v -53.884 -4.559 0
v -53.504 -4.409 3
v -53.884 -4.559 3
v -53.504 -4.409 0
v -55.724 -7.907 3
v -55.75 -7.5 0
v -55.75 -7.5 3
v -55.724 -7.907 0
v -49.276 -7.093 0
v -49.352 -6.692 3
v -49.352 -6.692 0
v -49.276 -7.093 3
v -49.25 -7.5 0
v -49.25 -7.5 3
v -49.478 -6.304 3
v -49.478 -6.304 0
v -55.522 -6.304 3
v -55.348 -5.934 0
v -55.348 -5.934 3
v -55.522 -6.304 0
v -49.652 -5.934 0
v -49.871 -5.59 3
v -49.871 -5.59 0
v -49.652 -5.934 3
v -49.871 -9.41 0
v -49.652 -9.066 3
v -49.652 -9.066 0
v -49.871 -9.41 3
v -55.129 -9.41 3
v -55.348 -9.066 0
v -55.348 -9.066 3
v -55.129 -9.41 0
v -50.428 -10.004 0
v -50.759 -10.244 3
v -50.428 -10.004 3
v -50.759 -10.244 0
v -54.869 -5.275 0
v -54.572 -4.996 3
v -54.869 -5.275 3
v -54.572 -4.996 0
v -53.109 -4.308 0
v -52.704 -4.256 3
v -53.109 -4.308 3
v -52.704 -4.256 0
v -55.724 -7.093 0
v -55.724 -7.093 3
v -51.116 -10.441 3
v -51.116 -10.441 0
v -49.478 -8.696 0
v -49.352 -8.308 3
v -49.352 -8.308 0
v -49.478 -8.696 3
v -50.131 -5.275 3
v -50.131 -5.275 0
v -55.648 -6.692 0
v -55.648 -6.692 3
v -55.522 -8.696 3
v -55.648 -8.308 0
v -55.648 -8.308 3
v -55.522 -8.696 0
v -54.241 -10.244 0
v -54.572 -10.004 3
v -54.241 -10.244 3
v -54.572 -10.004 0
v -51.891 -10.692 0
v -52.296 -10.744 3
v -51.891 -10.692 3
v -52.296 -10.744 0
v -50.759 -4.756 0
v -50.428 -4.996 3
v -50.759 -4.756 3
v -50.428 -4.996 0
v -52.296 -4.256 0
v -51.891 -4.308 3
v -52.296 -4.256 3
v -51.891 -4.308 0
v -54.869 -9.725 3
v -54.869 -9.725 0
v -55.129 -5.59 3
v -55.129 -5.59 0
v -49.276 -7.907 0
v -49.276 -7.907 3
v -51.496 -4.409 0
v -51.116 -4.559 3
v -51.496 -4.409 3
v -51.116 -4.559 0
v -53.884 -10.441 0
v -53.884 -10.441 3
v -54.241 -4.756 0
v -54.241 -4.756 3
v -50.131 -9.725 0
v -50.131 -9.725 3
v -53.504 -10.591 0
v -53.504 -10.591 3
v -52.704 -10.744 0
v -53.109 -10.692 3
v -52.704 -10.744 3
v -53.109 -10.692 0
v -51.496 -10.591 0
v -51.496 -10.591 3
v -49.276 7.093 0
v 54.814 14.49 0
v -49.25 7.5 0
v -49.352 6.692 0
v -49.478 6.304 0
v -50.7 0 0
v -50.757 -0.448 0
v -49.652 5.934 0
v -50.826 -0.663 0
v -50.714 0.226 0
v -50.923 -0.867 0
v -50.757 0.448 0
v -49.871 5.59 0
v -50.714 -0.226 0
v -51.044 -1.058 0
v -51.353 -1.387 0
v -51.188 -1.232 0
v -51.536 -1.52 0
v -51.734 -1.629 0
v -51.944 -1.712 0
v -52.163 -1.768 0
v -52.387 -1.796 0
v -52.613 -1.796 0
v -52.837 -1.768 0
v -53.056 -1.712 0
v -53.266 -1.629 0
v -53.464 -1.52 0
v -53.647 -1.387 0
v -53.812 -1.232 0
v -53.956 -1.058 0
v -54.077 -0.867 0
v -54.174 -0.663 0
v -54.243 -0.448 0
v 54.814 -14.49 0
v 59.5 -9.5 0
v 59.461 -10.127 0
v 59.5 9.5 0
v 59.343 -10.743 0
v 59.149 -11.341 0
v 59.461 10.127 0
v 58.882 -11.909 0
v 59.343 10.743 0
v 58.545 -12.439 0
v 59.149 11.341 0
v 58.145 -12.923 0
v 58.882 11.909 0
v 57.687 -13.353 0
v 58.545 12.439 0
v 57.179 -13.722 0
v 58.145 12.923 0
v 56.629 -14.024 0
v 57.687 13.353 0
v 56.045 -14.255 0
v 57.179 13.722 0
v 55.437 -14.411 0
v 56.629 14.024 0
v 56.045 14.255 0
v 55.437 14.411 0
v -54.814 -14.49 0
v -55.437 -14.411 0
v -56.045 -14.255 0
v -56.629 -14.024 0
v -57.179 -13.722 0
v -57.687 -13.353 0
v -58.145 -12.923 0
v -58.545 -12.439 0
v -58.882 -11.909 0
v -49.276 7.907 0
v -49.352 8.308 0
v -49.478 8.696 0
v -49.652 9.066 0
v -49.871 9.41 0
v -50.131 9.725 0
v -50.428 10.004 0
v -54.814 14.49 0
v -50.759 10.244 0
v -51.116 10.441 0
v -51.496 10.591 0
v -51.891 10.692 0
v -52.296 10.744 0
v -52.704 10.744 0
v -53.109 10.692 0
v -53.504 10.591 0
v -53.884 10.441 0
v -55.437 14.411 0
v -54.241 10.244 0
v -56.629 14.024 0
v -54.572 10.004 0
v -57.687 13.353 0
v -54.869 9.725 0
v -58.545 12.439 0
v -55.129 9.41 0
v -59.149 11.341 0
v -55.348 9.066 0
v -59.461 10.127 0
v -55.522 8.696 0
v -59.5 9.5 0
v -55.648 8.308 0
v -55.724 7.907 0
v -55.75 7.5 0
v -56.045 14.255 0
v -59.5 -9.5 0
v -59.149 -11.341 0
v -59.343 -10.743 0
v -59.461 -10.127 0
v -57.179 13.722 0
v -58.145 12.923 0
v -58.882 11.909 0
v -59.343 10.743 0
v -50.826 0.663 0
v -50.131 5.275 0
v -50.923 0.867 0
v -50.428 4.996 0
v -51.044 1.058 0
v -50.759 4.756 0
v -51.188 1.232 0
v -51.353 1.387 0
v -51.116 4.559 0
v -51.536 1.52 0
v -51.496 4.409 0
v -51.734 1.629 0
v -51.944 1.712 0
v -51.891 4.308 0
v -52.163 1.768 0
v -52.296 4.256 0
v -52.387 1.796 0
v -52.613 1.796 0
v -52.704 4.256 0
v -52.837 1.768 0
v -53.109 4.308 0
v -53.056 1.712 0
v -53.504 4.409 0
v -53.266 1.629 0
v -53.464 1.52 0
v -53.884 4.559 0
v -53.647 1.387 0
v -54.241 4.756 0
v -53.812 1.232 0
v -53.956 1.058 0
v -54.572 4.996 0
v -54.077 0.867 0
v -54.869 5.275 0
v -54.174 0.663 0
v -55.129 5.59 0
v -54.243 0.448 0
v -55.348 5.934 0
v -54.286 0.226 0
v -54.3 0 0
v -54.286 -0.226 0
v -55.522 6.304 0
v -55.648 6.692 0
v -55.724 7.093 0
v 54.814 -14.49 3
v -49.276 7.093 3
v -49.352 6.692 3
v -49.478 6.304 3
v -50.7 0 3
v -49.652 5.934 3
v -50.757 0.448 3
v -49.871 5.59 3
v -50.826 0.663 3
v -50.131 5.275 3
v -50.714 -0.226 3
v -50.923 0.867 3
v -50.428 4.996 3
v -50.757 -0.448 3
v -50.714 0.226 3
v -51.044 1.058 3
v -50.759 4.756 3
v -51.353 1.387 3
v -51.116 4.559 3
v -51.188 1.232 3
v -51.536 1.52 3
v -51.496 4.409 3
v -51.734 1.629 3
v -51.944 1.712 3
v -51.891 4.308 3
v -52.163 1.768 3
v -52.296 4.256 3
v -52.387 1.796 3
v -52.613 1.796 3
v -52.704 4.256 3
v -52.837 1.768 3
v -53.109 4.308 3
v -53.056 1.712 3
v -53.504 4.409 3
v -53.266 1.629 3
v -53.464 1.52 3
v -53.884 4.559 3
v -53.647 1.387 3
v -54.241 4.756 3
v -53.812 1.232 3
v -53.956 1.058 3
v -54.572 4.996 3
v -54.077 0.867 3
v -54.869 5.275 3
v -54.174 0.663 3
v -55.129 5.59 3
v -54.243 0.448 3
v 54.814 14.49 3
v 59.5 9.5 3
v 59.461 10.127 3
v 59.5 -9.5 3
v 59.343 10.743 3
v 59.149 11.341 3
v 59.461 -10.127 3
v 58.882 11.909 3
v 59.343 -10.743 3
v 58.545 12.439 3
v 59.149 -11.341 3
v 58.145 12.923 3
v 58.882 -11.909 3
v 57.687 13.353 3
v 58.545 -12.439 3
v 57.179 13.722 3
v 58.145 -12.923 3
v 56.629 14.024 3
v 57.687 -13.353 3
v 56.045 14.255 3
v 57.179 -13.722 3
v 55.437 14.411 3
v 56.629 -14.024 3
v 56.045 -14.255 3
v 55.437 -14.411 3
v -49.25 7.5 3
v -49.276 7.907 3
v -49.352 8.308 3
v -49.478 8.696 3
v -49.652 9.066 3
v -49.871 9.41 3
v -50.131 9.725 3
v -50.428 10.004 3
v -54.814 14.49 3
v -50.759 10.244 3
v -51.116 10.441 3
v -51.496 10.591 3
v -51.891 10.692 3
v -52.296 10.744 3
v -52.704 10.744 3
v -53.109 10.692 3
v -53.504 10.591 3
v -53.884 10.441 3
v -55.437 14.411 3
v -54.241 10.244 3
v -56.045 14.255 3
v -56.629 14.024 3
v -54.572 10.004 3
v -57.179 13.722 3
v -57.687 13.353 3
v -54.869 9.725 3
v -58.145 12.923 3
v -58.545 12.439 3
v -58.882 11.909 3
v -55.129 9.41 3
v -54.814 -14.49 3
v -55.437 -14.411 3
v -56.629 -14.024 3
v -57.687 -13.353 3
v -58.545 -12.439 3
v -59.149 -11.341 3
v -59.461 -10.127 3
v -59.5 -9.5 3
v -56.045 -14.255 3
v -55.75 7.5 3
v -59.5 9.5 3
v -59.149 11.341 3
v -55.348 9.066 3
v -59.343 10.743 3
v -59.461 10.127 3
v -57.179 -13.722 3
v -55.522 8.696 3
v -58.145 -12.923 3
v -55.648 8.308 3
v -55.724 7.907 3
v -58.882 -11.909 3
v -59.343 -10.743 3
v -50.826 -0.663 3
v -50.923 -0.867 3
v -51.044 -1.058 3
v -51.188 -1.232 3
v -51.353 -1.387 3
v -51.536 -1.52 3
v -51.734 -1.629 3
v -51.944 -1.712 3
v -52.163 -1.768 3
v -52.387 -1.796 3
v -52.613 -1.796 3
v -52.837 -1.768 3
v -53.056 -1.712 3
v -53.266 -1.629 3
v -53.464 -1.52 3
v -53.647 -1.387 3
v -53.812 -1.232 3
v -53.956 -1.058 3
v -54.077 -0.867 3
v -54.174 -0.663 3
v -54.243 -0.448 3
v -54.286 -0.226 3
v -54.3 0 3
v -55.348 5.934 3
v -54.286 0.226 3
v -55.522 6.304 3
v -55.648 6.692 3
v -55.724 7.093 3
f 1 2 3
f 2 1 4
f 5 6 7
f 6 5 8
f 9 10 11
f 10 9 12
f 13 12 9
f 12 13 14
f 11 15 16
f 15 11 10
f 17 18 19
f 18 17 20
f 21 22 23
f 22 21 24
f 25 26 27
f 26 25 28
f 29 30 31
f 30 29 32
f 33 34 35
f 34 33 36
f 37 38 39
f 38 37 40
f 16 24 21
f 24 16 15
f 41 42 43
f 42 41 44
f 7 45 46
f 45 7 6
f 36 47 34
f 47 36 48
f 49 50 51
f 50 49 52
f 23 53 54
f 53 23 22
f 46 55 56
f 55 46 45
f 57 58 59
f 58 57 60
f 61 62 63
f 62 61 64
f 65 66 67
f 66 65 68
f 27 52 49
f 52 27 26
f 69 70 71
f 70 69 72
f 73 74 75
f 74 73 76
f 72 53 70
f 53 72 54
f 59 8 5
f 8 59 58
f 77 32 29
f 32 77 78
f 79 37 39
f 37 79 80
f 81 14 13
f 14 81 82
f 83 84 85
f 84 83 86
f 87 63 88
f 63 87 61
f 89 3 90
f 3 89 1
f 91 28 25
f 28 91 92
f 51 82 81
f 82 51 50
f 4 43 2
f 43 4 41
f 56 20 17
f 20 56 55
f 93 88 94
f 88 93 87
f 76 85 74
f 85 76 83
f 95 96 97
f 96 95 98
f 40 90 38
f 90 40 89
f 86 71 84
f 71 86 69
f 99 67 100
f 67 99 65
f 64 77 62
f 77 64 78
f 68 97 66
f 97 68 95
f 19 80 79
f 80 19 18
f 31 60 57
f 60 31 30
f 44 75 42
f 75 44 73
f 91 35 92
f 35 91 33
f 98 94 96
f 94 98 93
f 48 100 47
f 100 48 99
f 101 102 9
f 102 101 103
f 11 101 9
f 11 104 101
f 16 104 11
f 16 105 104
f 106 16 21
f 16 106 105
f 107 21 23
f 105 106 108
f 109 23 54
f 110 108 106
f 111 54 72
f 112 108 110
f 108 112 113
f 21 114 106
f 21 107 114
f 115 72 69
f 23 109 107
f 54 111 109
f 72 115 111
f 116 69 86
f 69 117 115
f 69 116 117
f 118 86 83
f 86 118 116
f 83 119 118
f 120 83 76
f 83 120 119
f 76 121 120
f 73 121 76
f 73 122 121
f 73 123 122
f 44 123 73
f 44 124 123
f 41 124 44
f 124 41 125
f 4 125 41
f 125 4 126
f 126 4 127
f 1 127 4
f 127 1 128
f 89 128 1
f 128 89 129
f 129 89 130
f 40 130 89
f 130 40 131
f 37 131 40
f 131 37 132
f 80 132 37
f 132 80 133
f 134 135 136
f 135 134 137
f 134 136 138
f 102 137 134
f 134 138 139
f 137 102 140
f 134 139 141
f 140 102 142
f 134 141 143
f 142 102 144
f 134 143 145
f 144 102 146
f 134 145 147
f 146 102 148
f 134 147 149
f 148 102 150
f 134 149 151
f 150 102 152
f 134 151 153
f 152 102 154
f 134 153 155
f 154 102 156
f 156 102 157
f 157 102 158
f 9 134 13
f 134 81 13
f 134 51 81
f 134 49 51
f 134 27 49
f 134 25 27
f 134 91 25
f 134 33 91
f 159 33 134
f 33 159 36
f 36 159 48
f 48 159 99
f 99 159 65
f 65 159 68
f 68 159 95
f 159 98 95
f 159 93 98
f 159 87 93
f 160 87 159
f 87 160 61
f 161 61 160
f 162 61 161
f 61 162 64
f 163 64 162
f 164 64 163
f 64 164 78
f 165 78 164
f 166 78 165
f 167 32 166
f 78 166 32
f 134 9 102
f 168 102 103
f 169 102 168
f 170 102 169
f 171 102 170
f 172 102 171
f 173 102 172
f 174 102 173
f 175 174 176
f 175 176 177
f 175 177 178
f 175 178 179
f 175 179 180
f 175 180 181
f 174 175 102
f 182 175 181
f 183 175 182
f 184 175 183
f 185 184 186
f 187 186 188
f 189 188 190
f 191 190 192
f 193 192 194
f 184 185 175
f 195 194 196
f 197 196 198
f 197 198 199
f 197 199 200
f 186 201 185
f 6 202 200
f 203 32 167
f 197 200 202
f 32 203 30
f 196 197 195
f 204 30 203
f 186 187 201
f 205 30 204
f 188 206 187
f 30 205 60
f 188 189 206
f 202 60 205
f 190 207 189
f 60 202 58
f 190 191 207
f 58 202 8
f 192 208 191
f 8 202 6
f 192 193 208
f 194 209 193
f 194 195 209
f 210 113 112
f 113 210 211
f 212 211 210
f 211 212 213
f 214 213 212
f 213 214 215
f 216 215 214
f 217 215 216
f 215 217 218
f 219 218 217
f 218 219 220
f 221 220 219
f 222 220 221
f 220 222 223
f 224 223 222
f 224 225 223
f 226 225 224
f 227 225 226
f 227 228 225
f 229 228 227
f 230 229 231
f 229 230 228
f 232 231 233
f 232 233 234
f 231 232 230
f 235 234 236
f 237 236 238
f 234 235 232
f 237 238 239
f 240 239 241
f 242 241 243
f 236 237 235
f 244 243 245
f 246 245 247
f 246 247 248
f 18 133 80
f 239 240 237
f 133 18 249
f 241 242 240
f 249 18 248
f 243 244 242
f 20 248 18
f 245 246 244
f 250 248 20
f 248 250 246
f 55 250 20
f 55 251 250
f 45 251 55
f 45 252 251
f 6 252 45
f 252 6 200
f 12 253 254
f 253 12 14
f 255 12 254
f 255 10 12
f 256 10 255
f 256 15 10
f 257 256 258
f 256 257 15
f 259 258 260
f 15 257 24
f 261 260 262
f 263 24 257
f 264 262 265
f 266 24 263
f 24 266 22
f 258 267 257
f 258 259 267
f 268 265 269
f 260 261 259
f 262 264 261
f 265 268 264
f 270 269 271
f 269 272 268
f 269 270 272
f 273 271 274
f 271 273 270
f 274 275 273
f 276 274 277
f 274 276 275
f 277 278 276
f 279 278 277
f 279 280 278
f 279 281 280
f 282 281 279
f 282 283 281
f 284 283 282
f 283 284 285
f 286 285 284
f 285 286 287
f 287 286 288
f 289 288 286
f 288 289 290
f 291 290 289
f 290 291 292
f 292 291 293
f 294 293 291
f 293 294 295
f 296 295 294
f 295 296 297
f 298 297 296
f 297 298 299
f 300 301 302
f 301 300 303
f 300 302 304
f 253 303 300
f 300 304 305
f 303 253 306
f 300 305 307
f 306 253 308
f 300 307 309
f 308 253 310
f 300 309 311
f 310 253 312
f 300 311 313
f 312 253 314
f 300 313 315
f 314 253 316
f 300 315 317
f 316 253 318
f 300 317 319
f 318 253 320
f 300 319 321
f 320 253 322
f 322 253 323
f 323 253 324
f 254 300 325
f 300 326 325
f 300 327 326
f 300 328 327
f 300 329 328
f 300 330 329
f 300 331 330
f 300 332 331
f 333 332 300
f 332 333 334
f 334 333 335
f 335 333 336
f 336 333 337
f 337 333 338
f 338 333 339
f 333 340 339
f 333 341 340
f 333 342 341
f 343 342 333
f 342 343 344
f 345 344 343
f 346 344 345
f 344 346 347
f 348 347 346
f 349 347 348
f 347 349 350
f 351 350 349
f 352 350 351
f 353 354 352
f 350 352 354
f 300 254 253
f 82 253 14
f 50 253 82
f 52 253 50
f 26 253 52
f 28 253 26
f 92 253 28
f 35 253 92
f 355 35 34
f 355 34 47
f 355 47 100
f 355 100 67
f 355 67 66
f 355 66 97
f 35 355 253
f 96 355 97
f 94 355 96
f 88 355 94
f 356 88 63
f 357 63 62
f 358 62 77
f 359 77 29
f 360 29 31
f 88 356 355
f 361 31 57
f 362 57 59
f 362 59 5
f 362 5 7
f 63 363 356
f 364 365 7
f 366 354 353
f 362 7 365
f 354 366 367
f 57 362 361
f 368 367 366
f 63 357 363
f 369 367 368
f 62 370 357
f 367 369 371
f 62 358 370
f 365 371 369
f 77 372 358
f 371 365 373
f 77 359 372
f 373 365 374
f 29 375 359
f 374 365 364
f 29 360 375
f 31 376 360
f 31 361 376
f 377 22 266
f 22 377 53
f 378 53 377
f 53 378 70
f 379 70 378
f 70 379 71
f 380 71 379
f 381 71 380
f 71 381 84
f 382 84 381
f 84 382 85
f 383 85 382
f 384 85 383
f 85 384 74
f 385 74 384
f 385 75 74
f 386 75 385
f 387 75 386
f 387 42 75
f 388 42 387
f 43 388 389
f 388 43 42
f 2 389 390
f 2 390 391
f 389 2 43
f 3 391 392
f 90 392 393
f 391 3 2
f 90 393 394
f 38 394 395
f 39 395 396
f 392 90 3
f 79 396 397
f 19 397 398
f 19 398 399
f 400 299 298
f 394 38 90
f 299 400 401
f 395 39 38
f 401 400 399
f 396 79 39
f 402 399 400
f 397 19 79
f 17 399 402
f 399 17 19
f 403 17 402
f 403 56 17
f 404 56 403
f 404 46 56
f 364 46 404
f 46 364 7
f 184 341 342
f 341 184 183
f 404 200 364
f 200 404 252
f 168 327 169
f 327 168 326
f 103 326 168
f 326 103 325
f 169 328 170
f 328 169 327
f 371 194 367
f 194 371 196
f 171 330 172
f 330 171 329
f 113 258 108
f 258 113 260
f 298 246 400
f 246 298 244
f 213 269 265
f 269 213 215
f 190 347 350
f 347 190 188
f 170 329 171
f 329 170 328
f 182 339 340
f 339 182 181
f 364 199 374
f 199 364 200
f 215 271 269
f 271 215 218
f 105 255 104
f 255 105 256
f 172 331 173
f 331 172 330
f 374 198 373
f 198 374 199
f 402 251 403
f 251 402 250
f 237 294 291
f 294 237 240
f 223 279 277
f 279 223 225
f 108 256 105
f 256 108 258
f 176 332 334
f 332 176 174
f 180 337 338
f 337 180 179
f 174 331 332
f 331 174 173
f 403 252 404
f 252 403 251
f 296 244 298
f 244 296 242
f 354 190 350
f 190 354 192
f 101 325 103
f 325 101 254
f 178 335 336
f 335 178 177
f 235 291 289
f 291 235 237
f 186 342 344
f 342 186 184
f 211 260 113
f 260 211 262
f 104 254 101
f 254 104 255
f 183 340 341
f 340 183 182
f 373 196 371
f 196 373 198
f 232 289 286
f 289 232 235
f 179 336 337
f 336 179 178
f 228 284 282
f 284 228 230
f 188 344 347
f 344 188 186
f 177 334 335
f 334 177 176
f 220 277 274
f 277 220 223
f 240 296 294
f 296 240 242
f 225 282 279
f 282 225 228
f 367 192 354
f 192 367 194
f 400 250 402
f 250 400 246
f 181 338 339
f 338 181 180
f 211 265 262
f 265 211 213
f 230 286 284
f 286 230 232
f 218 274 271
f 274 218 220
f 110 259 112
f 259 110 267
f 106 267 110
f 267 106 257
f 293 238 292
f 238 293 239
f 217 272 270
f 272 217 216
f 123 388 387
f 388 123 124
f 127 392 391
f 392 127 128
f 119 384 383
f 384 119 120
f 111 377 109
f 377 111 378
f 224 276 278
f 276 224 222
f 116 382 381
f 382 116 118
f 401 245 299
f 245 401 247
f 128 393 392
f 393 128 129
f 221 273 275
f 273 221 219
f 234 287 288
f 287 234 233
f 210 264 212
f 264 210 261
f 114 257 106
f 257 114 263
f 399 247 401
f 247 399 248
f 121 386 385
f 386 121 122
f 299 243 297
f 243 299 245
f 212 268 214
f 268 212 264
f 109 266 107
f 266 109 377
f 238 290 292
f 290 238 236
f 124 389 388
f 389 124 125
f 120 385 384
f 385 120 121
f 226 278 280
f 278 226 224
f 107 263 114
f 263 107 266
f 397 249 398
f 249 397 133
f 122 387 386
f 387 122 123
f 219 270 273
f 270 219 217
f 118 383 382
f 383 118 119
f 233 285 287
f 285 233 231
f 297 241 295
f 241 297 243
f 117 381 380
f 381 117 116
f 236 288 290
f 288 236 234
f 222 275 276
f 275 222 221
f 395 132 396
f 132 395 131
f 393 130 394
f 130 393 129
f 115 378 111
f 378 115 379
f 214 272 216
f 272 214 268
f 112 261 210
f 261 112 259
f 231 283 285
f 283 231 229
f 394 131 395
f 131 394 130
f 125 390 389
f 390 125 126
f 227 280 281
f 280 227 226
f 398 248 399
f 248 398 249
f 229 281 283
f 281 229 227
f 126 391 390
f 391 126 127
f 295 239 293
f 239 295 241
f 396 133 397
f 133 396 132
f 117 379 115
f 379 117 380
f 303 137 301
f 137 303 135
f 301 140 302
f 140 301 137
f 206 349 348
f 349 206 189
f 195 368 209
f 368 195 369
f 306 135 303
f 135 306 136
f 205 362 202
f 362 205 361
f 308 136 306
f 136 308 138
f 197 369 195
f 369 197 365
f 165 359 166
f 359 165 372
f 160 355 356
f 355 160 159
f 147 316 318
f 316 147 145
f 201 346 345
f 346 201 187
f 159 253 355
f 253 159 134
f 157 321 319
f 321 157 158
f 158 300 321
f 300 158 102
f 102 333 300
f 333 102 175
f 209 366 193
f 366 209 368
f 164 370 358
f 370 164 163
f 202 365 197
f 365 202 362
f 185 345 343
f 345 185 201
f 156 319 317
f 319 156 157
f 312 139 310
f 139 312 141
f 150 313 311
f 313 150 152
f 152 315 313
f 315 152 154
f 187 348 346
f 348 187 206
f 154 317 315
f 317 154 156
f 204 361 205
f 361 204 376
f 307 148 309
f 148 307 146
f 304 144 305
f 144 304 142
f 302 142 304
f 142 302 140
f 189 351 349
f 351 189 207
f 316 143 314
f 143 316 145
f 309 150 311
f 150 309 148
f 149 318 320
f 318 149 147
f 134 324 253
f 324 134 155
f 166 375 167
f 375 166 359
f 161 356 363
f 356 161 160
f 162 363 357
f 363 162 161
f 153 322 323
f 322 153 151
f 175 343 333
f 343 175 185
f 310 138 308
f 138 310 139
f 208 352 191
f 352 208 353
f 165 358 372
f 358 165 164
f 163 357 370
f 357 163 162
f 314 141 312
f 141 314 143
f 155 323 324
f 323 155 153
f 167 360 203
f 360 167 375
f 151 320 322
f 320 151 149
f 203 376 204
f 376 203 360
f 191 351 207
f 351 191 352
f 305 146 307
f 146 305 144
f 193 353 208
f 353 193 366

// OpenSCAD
$fn = 50;


difference() {
	union() {
		hull() {
			translate(v = [-54.5000000000, 9.5000000000, 0]) {
				cylinder(h = 3, r = 5);
			}
			translate(v = [54.5000000000, 9.5000000000, 0]) {
				cylinder(h = 3, r = 5);
			}
			translate(v = [-54.5000000000, -9.5000000000, 0]) {
				cylinder(h = 3, r = 5);
			}
			translate(v = [54.5000000000, -9.5000000000, 0]) {
				cylinder(h = 3, r = 5);
			}
		}
	}
	union() {
		translate(v = [-52.5000000000, -7.5000000000, 0]) {
			cylinder(h = 3, r = 3.2500000000);
		}
		translate(v = [-52.5000000000, 7.5000000000, 0]) {
			cylinder(h = 3, r = 3.2500000000);
		}
		translate(v = [-52.5000000000, -7.5000000000, 0]) {
			cylinder(h = 3, r = 1.8000000000);
		}
		translate(v = [-52.5000000000, 0.0000000000, 0]) {
			cylinder(h = 3, r = 1.8000000000);
		}
		translate(v = [-52.5000000000, 7.5000000000, 0]) {
			cylinder(h = 3, r = 1.8000000000);
		}
		translate(v = [-52.5000000000, -7.5000000000, 0]) {
			cylinder(h = 3, r = 1.8000000000);
		}
		translate(v = [-52.5000000000, 0.0000000000, 0]) {
			cylinder(h = 3, r = 1.8000000000);
		}
		translate(v = [-52.5000000000, 7.5000000000, 0]) {
			cylinder(h = 3, r = 1.8000000000);
		}
		translate(v = [-52.5000000000, -7.5000000000, 0]) {
			cylinder(h = 3, r = 1.8000000000);
		}
		translate(v = [-52.5000000000, 0.0000000000, 0]) {
			cylinder(h = 3, r = 1.8000000000);
		}
		translate(v = [-52.5000000000, 7.5000000000, 0]) {
			cylinder(h = 3, r = 1.8000000000);
		}
	}
}
